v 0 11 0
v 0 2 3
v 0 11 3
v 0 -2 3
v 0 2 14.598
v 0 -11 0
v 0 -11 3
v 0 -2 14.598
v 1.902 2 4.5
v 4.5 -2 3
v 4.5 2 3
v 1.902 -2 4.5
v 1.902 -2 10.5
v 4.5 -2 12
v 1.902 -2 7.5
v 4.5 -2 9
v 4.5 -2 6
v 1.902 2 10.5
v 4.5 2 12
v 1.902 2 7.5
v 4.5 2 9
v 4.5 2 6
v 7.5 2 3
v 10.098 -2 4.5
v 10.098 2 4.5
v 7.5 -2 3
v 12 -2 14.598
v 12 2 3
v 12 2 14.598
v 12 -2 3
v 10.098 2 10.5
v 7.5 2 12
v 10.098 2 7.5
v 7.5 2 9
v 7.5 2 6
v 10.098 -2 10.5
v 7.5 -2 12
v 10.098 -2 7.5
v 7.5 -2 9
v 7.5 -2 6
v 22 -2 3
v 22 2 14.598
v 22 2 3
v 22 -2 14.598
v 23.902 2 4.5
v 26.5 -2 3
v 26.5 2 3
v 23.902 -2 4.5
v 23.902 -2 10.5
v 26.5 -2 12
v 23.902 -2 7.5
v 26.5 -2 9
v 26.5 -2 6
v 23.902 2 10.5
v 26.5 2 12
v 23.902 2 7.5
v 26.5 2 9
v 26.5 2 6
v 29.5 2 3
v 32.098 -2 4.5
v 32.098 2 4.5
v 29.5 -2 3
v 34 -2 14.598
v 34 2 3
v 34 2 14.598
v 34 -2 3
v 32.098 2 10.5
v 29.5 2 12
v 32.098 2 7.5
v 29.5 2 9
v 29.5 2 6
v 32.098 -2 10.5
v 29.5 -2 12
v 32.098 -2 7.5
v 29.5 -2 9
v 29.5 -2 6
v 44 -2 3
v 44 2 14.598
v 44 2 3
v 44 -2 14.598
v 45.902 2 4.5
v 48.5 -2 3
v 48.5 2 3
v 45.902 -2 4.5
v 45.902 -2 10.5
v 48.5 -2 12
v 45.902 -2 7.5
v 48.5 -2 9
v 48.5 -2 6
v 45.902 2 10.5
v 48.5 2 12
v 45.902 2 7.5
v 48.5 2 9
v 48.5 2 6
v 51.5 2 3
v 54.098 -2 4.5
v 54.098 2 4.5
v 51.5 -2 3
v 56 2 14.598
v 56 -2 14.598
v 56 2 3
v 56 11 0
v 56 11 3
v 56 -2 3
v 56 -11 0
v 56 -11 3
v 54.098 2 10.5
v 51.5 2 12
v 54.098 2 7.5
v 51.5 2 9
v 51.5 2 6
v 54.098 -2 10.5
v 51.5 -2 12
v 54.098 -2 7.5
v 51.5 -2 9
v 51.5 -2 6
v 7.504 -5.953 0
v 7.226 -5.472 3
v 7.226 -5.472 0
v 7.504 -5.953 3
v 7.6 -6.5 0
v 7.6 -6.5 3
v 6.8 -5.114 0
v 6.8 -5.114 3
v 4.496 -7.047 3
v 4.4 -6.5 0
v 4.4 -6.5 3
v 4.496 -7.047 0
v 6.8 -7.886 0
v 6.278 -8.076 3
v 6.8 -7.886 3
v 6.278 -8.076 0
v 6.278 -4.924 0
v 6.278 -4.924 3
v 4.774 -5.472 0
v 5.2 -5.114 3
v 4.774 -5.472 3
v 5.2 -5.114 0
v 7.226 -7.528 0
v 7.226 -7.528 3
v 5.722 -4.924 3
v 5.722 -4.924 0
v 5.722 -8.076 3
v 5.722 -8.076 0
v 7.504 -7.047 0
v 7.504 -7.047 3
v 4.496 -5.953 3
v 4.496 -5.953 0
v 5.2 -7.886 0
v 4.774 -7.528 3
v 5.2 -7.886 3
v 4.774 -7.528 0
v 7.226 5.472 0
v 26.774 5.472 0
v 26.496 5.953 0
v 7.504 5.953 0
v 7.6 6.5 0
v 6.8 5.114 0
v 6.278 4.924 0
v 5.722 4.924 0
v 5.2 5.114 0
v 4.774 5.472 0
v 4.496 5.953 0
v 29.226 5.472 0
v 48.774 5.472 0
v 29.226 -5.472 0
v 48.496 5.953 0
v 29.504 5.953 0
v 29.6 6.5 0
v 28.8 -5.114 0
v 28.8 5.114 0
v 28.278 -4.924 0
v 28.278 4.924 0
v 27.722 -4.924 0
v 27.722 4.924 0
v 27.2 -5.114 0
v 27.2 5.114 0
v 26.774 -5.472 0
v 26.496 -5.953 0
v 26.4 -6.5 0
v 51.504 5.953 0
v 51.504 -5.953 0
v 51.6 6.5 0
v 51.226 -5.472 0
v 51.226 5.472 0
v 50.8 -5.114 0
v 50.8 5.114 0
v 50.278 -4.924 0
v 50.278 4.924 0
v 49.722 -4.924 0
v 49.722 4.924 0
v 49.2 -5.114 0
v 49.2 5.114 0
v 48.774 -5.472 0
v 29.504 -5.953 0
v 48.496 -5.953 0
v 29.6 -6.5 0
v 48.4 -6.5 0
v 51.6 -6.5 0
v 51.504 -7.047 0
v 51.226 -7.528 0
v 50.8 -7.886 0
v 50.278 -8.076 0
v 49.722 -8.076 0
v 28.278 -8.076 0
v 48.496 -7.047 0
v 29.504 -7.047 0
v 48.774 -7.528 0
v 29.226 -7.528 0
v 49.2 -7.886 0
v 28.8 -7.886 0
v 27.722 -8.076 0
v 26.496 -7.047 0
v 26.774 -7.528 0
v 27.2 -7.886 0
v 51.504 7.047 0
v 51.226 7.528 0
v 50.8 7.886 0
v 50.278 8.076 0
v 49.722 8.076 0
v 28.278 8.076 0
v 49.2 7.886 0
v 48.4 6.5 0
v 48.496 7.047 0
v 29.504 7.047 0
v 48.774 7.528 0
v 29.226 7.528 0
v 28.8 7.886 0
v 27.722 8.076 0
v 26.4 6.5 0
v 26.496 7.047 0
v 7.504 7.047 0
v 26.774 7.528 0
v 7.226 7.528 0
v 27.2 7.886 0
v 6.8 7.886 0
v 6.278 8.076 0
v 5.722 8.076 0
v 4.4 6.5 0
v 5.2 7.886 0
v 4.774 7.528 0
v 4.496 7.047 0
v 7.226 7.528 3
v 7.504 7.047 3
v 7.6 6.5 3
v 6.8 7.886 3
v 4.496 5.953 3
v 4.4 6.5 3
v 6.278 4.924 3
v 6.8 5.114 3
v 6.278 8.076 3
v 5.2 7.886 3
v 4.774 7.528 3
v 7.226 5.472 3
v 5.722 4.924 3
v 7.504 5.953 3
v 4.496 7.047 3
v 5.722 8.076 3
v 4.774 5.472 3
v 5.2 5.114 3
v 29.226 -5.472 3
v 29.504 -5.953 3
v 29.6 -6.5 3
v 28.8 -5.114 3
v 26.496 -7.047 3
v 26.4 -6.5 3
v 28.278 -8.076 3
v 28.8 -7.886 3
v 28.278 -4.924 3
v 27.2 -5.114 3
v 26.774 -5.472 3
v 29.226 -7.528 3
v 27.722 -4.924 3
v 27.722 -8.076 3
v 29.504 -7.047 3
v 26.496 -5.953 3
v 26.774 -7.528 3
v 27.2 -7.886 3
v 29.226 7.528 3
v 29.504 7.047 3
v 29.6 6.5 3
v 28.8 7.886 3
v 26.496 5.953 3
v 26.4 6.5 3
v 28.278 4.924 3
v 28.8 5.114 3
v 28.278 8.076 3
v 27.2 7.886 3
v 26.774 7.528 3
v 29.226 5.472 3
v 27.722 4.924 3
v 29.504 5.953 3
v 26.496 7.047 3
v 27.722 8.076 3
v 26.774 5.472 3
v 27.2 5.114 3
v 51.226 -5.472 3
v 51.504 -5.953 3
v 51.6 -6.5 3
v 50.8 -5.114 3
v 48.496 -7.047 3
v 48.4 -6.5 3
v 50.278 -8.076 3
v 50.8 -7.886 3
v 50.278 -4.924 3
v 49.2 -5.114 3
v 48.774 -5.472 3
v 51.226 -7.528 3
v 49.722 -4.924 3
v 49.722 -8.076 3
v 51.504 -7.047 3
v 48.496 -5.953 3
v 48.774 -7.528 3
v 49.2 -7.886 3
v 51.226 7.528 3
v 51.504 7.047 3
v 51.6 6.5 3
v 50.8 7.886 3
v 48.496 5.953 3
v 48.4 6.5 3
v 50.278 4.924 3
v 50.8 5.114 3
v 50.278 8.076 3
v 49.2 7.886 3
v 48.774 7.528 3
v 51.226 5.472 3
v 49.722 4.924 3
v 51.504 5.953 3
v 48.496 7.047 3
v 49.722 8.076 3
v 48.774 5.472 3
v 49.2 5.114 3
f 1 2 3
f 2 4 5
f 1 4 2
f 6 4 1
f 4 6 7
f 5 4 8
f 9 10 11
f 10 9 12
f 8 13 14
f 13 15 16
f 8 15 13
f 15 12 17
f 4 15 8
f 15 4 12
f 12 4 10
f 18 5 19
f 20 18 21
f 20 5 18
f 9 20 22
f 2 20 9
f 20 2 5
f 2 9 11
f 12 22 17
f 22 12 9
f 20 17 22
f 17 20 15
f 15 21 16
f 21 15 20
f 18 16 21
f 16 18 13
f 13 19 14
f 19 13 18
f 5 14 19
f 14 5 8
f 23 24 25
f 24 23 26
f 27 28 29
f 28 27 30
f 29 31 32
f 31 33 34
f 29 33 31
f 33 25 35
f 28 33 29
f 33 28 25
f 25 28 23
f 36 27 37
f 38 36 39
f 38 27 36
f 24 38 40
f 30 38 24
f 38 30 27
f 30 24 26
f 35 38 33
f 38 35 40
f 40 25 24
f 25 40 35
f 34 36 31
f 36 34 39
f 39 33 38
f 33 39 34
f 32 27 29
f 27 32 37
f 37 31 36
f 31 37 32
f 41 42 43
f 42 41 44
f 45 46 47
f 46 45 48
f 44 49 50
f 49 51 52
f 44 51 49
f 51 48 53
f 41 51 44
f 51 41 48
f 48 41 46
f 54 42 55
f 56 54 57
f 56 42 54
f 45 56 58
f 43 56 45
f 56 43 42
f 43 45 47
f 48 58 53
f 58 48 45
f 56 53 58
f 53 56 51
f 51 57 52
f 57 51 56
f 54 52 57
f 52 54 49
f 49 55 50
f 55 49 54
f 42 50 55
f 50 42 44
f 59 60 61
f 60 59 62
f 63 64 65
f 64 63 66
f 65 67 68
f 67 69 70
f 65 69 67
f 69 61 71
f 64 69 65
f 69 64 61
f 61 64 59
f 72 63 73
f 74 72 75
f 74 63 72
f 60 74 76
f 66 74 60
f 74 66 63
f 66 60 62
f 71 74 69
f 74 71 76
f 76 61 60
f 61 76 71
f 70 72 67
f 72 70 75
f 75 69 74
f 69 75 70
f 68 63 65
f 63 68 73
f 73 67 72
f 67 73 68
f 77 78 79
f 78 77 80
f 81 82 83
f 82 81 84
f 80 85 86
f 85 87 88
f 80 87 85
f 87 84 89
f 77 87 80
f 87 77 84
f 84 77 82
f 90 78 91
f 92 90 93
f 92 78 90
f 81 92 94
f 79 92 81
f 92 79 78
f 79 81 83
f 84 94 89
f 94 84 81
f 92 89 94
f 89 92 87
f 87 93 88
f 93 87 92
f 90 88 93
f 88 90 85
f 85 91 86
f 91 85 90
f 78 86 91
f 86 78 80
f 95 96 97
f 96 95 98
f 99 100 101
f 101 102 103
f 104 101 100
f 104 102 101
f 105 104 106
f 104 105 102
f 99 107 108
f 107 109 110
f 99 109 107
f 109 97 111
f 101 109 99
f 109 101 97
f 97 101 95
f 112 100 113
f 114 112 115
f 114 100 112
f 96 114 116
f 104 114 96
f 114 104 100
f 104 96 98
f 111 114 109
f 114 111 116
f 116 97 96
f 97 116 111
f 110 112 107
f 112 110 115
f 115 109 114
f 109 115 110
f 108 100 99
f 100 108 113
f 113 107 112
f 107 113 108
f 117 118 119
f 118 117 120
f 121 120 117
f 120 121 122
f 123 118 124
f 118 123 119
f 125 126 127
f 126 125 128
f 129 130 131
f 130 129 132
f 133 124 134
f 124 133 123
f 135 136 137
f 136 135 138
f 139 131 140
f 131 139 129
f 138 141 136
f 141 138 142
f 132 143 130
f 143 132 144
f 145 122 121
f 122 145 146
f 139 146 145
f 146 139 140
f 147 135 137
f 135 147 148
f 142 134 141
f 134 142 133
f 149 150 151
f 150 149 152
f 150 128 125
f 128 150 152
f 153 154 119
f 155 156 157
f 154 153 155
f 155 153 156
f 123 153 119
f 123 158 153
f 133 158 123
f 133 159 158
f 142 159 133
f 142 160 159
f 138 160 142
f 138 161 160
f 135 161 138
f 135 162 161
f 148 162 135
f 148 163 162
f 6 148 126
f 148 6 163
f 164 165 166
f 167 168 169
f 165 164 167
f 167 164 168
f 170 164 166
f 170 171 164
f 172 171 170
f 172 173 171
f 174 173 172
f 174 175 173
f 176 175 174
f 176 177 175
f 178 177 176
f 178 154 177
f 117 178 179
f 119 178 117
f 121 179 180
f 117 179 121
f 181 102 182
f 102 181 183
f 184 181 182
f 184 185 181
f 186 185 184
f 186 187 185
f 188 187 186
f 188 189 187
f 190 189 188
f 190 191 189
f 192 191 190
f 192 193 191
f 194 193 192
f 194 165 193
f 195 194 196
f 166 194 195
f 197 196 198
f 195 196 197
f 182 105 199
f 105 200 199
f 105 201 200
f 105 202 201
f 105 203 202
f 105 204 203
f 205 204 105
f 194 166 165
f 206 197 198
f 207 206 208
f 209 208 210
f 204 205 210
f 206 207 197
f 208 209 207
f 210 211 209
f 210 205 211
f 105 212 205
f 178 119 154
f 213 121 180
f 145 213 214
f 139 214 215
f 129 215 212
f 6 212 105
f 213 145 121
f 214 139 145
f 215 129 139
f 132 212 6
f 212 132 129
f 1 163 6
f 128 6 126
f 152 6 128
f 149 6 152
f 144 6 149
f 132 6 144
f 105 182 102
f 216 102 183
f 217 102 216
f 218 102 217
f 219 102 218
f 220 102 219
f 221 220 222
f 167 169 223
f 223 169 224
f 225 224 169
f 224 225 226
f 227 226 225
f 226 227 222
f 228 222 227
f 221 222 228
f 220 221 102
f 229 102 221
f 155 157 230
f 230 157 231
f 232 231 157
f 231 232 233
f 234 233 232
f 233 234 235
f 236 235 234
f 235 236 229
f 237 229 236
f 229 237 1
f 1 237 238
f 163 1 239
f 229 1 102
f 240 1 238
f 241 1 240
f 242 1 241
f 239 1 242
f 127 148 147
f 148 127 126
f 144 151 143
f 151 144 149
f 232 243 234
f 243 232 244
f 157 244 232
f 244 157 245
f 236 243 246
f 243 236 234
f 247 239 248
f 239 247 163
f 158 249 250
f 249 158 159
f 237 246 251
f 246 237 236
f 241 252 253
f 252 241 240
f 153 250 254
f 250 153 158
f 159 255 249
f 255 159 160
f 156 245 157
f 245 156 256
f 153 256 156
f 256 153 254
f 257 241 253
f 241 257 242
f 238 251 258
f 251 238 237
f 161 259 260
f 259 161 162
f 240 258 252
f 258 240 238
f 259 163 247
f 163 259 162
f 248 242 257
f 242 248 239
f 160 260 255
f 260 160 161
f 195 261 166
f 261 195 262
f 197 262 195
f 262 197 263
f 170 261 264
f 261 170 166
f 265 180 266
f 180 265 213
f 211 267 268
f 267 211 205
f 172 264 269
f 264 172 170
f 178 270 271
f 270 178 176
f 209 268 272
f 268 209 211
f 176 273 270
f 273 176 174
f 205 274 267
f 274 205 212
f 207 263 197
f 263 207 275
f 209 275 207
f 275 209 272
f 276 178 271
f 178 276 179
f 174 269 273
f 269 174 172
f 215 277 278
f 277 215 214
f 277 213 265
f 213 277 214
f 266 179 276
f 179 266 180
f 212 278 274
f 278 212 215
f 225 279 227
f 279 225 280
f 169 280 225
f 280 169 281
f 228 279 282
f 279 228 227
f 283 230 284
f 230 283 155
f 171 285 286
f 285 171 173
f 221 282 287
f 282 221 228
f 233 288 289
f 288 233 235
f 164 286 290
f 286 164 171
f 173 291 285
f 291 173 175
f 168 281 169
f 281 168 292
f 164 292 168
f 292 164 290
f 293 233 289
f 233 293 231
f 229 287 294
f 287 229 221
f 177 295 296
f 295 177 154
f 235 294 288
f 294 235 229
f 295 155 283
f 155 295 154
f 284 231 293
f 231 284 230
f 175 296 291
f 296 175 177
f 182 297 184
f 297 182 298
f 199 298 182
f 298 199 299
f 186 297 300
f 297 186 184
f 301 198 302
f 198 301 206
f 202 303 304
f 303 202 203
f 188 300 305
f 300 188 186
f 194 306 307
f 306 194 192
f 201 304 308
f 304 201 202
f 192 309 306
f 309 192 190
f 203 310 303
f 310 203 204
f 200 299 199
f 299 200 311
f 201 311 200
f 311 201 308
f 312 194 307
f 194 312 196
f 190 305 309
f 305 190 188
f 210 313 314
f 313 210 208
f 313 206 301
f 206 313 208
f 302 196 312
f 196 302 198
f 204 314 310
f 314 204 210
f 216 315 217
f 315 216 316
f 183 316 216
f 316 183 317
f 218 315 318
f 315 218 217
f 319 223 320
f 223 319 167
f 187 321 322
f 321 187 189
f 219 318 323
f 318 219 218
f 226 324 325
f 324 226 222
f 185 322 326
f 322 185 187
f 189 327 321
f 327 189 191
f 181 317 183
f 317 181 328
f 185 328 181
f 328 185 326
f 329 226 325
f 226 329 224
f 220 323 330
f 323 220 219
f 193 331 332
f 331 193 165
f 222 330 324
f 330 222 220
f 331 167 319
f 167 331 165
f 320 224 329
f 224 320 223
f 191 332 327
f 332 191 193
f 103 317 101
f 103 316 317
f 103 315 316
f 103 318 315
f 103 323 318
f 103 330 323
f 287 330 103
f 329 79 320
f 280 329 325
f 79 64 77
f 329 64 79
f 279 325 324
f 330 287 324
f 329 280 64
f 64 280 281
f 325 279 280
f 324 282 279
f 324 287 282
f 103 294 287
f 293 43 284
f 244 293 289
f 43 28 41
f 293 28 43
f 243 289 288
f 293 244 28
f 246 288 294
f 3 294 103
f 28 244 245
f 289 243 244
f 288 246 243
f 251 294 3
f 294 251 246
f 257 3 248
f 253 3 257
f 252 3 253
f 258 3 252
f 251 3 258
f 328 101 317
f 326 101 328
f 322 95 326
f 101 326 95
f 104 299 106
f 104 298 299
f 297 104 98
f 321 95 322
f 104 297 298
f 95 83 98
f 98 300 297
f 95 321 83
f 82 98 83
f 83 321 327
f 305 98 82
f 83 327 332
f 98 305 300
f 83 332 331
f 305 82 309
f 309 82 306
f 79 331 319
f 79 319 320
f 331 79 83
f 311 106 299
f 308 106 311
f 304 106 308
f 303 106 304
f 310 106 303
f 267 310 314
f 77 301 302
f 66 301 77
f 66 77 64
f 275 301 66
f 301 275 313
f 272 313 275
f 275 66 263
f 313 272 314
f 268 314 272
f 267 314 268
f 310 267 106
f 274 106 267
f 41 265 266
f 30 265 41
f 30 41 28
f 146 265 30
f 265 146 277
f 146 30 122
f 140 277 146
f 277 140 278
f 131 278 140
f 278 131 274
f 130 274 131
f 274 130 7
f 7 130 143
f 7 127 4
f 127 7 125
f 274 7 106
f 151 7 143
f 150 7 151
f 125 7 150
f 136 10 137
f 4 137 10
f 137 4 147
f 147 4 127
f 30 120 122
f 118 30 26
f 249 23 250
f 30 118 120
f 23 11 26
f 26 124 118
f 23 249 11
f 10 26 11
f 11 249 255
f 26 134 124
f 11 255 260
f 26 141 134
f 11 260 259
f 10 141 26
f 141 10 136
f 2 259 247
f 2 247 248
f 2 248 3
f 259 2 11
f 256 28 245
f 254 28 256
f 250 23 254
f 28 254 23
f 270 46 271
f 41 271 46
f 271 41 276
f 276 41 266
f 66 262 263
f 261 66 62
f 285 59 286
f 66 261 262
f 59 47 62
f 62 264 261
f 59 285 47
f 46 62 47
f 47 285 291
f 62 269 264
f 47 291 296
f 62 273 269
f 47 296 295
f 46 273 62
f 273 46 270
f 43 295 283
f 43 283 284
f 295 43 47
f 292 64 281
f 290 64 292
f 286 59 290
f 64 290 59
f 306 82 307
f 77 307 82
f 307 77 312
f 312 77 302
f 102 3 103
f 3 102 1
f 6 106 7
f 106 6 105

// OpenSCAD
//The spacing between the teeth
cable_width = 3;

//The strength (thickness) of the holder clamp
cable_holder_thickness = 4;

//The depth of a tooth
tooth_depth = 3;

//Number of teeth in 1 holder
number_of_teeth = 4;

//The amount of holders on the base
number_of_holders = 3;

//The spacing between the holders
holder_spacing = 10;

/*[Hidden]*/
total_width = number_of_holders * (((tooth_depth*3) + cable_width) + holder_spacing) - holder_spacing;

module cableholder(width, tooth, teeth, thickness)
{
    //translate([-(tooth/2 + ((tooth*2) + width)/2),0,0])
    {
        union()
        {
            for(t=[1:teeth])
            {
                translate([tooth/2,0,t*tooth])
                rotate([90,0,0])
                cylinder(r=tooth,h=thickness,$fn=3,center=true);
            }
        }

        union()
        {
            for(t=[1:teeth])
            {
                translate([tooth/2 + ((tooth*2) + width),0, t*tooth])
                rotate([90,0,180])
                cylinder(r=tooth,h=thickness,$fn=3,center=true);
            }
        }
    }
}

for(h=[1:number_of_holders])
{
    translate([(h-1) * (((tooth_depth*3) + cable_width) + holder_spacing), 0, 0])
    cableholder(cable_width,tooth_depth,number_of_teeth,cable_holder_thickness);
}

render()
translate([0,-cable_holder_thickness/2 - 9,0])
{
    difference()
    {
        cube([total_width,cable_holder_thickness + 18,tooth_depth]);
        
        for(h=[1:number_of_holders])
        {
            translate([(h-1) * (((tooth_depth*3) + cable_width) + holder_spacing) + tooth_depth*1.5 + cable_width/2, 0, 0])
            {
                translate([0,4.5,0])
                cylinder(r=1.6,h=tooth_depth + 1,$fn=18);

                translate([0,4.5 + 9 + cable_holder_thickness,0])
                cylinder(r=1.6,h=tooth_depth + 1,$fn=18);
            }
        }
    }
}
